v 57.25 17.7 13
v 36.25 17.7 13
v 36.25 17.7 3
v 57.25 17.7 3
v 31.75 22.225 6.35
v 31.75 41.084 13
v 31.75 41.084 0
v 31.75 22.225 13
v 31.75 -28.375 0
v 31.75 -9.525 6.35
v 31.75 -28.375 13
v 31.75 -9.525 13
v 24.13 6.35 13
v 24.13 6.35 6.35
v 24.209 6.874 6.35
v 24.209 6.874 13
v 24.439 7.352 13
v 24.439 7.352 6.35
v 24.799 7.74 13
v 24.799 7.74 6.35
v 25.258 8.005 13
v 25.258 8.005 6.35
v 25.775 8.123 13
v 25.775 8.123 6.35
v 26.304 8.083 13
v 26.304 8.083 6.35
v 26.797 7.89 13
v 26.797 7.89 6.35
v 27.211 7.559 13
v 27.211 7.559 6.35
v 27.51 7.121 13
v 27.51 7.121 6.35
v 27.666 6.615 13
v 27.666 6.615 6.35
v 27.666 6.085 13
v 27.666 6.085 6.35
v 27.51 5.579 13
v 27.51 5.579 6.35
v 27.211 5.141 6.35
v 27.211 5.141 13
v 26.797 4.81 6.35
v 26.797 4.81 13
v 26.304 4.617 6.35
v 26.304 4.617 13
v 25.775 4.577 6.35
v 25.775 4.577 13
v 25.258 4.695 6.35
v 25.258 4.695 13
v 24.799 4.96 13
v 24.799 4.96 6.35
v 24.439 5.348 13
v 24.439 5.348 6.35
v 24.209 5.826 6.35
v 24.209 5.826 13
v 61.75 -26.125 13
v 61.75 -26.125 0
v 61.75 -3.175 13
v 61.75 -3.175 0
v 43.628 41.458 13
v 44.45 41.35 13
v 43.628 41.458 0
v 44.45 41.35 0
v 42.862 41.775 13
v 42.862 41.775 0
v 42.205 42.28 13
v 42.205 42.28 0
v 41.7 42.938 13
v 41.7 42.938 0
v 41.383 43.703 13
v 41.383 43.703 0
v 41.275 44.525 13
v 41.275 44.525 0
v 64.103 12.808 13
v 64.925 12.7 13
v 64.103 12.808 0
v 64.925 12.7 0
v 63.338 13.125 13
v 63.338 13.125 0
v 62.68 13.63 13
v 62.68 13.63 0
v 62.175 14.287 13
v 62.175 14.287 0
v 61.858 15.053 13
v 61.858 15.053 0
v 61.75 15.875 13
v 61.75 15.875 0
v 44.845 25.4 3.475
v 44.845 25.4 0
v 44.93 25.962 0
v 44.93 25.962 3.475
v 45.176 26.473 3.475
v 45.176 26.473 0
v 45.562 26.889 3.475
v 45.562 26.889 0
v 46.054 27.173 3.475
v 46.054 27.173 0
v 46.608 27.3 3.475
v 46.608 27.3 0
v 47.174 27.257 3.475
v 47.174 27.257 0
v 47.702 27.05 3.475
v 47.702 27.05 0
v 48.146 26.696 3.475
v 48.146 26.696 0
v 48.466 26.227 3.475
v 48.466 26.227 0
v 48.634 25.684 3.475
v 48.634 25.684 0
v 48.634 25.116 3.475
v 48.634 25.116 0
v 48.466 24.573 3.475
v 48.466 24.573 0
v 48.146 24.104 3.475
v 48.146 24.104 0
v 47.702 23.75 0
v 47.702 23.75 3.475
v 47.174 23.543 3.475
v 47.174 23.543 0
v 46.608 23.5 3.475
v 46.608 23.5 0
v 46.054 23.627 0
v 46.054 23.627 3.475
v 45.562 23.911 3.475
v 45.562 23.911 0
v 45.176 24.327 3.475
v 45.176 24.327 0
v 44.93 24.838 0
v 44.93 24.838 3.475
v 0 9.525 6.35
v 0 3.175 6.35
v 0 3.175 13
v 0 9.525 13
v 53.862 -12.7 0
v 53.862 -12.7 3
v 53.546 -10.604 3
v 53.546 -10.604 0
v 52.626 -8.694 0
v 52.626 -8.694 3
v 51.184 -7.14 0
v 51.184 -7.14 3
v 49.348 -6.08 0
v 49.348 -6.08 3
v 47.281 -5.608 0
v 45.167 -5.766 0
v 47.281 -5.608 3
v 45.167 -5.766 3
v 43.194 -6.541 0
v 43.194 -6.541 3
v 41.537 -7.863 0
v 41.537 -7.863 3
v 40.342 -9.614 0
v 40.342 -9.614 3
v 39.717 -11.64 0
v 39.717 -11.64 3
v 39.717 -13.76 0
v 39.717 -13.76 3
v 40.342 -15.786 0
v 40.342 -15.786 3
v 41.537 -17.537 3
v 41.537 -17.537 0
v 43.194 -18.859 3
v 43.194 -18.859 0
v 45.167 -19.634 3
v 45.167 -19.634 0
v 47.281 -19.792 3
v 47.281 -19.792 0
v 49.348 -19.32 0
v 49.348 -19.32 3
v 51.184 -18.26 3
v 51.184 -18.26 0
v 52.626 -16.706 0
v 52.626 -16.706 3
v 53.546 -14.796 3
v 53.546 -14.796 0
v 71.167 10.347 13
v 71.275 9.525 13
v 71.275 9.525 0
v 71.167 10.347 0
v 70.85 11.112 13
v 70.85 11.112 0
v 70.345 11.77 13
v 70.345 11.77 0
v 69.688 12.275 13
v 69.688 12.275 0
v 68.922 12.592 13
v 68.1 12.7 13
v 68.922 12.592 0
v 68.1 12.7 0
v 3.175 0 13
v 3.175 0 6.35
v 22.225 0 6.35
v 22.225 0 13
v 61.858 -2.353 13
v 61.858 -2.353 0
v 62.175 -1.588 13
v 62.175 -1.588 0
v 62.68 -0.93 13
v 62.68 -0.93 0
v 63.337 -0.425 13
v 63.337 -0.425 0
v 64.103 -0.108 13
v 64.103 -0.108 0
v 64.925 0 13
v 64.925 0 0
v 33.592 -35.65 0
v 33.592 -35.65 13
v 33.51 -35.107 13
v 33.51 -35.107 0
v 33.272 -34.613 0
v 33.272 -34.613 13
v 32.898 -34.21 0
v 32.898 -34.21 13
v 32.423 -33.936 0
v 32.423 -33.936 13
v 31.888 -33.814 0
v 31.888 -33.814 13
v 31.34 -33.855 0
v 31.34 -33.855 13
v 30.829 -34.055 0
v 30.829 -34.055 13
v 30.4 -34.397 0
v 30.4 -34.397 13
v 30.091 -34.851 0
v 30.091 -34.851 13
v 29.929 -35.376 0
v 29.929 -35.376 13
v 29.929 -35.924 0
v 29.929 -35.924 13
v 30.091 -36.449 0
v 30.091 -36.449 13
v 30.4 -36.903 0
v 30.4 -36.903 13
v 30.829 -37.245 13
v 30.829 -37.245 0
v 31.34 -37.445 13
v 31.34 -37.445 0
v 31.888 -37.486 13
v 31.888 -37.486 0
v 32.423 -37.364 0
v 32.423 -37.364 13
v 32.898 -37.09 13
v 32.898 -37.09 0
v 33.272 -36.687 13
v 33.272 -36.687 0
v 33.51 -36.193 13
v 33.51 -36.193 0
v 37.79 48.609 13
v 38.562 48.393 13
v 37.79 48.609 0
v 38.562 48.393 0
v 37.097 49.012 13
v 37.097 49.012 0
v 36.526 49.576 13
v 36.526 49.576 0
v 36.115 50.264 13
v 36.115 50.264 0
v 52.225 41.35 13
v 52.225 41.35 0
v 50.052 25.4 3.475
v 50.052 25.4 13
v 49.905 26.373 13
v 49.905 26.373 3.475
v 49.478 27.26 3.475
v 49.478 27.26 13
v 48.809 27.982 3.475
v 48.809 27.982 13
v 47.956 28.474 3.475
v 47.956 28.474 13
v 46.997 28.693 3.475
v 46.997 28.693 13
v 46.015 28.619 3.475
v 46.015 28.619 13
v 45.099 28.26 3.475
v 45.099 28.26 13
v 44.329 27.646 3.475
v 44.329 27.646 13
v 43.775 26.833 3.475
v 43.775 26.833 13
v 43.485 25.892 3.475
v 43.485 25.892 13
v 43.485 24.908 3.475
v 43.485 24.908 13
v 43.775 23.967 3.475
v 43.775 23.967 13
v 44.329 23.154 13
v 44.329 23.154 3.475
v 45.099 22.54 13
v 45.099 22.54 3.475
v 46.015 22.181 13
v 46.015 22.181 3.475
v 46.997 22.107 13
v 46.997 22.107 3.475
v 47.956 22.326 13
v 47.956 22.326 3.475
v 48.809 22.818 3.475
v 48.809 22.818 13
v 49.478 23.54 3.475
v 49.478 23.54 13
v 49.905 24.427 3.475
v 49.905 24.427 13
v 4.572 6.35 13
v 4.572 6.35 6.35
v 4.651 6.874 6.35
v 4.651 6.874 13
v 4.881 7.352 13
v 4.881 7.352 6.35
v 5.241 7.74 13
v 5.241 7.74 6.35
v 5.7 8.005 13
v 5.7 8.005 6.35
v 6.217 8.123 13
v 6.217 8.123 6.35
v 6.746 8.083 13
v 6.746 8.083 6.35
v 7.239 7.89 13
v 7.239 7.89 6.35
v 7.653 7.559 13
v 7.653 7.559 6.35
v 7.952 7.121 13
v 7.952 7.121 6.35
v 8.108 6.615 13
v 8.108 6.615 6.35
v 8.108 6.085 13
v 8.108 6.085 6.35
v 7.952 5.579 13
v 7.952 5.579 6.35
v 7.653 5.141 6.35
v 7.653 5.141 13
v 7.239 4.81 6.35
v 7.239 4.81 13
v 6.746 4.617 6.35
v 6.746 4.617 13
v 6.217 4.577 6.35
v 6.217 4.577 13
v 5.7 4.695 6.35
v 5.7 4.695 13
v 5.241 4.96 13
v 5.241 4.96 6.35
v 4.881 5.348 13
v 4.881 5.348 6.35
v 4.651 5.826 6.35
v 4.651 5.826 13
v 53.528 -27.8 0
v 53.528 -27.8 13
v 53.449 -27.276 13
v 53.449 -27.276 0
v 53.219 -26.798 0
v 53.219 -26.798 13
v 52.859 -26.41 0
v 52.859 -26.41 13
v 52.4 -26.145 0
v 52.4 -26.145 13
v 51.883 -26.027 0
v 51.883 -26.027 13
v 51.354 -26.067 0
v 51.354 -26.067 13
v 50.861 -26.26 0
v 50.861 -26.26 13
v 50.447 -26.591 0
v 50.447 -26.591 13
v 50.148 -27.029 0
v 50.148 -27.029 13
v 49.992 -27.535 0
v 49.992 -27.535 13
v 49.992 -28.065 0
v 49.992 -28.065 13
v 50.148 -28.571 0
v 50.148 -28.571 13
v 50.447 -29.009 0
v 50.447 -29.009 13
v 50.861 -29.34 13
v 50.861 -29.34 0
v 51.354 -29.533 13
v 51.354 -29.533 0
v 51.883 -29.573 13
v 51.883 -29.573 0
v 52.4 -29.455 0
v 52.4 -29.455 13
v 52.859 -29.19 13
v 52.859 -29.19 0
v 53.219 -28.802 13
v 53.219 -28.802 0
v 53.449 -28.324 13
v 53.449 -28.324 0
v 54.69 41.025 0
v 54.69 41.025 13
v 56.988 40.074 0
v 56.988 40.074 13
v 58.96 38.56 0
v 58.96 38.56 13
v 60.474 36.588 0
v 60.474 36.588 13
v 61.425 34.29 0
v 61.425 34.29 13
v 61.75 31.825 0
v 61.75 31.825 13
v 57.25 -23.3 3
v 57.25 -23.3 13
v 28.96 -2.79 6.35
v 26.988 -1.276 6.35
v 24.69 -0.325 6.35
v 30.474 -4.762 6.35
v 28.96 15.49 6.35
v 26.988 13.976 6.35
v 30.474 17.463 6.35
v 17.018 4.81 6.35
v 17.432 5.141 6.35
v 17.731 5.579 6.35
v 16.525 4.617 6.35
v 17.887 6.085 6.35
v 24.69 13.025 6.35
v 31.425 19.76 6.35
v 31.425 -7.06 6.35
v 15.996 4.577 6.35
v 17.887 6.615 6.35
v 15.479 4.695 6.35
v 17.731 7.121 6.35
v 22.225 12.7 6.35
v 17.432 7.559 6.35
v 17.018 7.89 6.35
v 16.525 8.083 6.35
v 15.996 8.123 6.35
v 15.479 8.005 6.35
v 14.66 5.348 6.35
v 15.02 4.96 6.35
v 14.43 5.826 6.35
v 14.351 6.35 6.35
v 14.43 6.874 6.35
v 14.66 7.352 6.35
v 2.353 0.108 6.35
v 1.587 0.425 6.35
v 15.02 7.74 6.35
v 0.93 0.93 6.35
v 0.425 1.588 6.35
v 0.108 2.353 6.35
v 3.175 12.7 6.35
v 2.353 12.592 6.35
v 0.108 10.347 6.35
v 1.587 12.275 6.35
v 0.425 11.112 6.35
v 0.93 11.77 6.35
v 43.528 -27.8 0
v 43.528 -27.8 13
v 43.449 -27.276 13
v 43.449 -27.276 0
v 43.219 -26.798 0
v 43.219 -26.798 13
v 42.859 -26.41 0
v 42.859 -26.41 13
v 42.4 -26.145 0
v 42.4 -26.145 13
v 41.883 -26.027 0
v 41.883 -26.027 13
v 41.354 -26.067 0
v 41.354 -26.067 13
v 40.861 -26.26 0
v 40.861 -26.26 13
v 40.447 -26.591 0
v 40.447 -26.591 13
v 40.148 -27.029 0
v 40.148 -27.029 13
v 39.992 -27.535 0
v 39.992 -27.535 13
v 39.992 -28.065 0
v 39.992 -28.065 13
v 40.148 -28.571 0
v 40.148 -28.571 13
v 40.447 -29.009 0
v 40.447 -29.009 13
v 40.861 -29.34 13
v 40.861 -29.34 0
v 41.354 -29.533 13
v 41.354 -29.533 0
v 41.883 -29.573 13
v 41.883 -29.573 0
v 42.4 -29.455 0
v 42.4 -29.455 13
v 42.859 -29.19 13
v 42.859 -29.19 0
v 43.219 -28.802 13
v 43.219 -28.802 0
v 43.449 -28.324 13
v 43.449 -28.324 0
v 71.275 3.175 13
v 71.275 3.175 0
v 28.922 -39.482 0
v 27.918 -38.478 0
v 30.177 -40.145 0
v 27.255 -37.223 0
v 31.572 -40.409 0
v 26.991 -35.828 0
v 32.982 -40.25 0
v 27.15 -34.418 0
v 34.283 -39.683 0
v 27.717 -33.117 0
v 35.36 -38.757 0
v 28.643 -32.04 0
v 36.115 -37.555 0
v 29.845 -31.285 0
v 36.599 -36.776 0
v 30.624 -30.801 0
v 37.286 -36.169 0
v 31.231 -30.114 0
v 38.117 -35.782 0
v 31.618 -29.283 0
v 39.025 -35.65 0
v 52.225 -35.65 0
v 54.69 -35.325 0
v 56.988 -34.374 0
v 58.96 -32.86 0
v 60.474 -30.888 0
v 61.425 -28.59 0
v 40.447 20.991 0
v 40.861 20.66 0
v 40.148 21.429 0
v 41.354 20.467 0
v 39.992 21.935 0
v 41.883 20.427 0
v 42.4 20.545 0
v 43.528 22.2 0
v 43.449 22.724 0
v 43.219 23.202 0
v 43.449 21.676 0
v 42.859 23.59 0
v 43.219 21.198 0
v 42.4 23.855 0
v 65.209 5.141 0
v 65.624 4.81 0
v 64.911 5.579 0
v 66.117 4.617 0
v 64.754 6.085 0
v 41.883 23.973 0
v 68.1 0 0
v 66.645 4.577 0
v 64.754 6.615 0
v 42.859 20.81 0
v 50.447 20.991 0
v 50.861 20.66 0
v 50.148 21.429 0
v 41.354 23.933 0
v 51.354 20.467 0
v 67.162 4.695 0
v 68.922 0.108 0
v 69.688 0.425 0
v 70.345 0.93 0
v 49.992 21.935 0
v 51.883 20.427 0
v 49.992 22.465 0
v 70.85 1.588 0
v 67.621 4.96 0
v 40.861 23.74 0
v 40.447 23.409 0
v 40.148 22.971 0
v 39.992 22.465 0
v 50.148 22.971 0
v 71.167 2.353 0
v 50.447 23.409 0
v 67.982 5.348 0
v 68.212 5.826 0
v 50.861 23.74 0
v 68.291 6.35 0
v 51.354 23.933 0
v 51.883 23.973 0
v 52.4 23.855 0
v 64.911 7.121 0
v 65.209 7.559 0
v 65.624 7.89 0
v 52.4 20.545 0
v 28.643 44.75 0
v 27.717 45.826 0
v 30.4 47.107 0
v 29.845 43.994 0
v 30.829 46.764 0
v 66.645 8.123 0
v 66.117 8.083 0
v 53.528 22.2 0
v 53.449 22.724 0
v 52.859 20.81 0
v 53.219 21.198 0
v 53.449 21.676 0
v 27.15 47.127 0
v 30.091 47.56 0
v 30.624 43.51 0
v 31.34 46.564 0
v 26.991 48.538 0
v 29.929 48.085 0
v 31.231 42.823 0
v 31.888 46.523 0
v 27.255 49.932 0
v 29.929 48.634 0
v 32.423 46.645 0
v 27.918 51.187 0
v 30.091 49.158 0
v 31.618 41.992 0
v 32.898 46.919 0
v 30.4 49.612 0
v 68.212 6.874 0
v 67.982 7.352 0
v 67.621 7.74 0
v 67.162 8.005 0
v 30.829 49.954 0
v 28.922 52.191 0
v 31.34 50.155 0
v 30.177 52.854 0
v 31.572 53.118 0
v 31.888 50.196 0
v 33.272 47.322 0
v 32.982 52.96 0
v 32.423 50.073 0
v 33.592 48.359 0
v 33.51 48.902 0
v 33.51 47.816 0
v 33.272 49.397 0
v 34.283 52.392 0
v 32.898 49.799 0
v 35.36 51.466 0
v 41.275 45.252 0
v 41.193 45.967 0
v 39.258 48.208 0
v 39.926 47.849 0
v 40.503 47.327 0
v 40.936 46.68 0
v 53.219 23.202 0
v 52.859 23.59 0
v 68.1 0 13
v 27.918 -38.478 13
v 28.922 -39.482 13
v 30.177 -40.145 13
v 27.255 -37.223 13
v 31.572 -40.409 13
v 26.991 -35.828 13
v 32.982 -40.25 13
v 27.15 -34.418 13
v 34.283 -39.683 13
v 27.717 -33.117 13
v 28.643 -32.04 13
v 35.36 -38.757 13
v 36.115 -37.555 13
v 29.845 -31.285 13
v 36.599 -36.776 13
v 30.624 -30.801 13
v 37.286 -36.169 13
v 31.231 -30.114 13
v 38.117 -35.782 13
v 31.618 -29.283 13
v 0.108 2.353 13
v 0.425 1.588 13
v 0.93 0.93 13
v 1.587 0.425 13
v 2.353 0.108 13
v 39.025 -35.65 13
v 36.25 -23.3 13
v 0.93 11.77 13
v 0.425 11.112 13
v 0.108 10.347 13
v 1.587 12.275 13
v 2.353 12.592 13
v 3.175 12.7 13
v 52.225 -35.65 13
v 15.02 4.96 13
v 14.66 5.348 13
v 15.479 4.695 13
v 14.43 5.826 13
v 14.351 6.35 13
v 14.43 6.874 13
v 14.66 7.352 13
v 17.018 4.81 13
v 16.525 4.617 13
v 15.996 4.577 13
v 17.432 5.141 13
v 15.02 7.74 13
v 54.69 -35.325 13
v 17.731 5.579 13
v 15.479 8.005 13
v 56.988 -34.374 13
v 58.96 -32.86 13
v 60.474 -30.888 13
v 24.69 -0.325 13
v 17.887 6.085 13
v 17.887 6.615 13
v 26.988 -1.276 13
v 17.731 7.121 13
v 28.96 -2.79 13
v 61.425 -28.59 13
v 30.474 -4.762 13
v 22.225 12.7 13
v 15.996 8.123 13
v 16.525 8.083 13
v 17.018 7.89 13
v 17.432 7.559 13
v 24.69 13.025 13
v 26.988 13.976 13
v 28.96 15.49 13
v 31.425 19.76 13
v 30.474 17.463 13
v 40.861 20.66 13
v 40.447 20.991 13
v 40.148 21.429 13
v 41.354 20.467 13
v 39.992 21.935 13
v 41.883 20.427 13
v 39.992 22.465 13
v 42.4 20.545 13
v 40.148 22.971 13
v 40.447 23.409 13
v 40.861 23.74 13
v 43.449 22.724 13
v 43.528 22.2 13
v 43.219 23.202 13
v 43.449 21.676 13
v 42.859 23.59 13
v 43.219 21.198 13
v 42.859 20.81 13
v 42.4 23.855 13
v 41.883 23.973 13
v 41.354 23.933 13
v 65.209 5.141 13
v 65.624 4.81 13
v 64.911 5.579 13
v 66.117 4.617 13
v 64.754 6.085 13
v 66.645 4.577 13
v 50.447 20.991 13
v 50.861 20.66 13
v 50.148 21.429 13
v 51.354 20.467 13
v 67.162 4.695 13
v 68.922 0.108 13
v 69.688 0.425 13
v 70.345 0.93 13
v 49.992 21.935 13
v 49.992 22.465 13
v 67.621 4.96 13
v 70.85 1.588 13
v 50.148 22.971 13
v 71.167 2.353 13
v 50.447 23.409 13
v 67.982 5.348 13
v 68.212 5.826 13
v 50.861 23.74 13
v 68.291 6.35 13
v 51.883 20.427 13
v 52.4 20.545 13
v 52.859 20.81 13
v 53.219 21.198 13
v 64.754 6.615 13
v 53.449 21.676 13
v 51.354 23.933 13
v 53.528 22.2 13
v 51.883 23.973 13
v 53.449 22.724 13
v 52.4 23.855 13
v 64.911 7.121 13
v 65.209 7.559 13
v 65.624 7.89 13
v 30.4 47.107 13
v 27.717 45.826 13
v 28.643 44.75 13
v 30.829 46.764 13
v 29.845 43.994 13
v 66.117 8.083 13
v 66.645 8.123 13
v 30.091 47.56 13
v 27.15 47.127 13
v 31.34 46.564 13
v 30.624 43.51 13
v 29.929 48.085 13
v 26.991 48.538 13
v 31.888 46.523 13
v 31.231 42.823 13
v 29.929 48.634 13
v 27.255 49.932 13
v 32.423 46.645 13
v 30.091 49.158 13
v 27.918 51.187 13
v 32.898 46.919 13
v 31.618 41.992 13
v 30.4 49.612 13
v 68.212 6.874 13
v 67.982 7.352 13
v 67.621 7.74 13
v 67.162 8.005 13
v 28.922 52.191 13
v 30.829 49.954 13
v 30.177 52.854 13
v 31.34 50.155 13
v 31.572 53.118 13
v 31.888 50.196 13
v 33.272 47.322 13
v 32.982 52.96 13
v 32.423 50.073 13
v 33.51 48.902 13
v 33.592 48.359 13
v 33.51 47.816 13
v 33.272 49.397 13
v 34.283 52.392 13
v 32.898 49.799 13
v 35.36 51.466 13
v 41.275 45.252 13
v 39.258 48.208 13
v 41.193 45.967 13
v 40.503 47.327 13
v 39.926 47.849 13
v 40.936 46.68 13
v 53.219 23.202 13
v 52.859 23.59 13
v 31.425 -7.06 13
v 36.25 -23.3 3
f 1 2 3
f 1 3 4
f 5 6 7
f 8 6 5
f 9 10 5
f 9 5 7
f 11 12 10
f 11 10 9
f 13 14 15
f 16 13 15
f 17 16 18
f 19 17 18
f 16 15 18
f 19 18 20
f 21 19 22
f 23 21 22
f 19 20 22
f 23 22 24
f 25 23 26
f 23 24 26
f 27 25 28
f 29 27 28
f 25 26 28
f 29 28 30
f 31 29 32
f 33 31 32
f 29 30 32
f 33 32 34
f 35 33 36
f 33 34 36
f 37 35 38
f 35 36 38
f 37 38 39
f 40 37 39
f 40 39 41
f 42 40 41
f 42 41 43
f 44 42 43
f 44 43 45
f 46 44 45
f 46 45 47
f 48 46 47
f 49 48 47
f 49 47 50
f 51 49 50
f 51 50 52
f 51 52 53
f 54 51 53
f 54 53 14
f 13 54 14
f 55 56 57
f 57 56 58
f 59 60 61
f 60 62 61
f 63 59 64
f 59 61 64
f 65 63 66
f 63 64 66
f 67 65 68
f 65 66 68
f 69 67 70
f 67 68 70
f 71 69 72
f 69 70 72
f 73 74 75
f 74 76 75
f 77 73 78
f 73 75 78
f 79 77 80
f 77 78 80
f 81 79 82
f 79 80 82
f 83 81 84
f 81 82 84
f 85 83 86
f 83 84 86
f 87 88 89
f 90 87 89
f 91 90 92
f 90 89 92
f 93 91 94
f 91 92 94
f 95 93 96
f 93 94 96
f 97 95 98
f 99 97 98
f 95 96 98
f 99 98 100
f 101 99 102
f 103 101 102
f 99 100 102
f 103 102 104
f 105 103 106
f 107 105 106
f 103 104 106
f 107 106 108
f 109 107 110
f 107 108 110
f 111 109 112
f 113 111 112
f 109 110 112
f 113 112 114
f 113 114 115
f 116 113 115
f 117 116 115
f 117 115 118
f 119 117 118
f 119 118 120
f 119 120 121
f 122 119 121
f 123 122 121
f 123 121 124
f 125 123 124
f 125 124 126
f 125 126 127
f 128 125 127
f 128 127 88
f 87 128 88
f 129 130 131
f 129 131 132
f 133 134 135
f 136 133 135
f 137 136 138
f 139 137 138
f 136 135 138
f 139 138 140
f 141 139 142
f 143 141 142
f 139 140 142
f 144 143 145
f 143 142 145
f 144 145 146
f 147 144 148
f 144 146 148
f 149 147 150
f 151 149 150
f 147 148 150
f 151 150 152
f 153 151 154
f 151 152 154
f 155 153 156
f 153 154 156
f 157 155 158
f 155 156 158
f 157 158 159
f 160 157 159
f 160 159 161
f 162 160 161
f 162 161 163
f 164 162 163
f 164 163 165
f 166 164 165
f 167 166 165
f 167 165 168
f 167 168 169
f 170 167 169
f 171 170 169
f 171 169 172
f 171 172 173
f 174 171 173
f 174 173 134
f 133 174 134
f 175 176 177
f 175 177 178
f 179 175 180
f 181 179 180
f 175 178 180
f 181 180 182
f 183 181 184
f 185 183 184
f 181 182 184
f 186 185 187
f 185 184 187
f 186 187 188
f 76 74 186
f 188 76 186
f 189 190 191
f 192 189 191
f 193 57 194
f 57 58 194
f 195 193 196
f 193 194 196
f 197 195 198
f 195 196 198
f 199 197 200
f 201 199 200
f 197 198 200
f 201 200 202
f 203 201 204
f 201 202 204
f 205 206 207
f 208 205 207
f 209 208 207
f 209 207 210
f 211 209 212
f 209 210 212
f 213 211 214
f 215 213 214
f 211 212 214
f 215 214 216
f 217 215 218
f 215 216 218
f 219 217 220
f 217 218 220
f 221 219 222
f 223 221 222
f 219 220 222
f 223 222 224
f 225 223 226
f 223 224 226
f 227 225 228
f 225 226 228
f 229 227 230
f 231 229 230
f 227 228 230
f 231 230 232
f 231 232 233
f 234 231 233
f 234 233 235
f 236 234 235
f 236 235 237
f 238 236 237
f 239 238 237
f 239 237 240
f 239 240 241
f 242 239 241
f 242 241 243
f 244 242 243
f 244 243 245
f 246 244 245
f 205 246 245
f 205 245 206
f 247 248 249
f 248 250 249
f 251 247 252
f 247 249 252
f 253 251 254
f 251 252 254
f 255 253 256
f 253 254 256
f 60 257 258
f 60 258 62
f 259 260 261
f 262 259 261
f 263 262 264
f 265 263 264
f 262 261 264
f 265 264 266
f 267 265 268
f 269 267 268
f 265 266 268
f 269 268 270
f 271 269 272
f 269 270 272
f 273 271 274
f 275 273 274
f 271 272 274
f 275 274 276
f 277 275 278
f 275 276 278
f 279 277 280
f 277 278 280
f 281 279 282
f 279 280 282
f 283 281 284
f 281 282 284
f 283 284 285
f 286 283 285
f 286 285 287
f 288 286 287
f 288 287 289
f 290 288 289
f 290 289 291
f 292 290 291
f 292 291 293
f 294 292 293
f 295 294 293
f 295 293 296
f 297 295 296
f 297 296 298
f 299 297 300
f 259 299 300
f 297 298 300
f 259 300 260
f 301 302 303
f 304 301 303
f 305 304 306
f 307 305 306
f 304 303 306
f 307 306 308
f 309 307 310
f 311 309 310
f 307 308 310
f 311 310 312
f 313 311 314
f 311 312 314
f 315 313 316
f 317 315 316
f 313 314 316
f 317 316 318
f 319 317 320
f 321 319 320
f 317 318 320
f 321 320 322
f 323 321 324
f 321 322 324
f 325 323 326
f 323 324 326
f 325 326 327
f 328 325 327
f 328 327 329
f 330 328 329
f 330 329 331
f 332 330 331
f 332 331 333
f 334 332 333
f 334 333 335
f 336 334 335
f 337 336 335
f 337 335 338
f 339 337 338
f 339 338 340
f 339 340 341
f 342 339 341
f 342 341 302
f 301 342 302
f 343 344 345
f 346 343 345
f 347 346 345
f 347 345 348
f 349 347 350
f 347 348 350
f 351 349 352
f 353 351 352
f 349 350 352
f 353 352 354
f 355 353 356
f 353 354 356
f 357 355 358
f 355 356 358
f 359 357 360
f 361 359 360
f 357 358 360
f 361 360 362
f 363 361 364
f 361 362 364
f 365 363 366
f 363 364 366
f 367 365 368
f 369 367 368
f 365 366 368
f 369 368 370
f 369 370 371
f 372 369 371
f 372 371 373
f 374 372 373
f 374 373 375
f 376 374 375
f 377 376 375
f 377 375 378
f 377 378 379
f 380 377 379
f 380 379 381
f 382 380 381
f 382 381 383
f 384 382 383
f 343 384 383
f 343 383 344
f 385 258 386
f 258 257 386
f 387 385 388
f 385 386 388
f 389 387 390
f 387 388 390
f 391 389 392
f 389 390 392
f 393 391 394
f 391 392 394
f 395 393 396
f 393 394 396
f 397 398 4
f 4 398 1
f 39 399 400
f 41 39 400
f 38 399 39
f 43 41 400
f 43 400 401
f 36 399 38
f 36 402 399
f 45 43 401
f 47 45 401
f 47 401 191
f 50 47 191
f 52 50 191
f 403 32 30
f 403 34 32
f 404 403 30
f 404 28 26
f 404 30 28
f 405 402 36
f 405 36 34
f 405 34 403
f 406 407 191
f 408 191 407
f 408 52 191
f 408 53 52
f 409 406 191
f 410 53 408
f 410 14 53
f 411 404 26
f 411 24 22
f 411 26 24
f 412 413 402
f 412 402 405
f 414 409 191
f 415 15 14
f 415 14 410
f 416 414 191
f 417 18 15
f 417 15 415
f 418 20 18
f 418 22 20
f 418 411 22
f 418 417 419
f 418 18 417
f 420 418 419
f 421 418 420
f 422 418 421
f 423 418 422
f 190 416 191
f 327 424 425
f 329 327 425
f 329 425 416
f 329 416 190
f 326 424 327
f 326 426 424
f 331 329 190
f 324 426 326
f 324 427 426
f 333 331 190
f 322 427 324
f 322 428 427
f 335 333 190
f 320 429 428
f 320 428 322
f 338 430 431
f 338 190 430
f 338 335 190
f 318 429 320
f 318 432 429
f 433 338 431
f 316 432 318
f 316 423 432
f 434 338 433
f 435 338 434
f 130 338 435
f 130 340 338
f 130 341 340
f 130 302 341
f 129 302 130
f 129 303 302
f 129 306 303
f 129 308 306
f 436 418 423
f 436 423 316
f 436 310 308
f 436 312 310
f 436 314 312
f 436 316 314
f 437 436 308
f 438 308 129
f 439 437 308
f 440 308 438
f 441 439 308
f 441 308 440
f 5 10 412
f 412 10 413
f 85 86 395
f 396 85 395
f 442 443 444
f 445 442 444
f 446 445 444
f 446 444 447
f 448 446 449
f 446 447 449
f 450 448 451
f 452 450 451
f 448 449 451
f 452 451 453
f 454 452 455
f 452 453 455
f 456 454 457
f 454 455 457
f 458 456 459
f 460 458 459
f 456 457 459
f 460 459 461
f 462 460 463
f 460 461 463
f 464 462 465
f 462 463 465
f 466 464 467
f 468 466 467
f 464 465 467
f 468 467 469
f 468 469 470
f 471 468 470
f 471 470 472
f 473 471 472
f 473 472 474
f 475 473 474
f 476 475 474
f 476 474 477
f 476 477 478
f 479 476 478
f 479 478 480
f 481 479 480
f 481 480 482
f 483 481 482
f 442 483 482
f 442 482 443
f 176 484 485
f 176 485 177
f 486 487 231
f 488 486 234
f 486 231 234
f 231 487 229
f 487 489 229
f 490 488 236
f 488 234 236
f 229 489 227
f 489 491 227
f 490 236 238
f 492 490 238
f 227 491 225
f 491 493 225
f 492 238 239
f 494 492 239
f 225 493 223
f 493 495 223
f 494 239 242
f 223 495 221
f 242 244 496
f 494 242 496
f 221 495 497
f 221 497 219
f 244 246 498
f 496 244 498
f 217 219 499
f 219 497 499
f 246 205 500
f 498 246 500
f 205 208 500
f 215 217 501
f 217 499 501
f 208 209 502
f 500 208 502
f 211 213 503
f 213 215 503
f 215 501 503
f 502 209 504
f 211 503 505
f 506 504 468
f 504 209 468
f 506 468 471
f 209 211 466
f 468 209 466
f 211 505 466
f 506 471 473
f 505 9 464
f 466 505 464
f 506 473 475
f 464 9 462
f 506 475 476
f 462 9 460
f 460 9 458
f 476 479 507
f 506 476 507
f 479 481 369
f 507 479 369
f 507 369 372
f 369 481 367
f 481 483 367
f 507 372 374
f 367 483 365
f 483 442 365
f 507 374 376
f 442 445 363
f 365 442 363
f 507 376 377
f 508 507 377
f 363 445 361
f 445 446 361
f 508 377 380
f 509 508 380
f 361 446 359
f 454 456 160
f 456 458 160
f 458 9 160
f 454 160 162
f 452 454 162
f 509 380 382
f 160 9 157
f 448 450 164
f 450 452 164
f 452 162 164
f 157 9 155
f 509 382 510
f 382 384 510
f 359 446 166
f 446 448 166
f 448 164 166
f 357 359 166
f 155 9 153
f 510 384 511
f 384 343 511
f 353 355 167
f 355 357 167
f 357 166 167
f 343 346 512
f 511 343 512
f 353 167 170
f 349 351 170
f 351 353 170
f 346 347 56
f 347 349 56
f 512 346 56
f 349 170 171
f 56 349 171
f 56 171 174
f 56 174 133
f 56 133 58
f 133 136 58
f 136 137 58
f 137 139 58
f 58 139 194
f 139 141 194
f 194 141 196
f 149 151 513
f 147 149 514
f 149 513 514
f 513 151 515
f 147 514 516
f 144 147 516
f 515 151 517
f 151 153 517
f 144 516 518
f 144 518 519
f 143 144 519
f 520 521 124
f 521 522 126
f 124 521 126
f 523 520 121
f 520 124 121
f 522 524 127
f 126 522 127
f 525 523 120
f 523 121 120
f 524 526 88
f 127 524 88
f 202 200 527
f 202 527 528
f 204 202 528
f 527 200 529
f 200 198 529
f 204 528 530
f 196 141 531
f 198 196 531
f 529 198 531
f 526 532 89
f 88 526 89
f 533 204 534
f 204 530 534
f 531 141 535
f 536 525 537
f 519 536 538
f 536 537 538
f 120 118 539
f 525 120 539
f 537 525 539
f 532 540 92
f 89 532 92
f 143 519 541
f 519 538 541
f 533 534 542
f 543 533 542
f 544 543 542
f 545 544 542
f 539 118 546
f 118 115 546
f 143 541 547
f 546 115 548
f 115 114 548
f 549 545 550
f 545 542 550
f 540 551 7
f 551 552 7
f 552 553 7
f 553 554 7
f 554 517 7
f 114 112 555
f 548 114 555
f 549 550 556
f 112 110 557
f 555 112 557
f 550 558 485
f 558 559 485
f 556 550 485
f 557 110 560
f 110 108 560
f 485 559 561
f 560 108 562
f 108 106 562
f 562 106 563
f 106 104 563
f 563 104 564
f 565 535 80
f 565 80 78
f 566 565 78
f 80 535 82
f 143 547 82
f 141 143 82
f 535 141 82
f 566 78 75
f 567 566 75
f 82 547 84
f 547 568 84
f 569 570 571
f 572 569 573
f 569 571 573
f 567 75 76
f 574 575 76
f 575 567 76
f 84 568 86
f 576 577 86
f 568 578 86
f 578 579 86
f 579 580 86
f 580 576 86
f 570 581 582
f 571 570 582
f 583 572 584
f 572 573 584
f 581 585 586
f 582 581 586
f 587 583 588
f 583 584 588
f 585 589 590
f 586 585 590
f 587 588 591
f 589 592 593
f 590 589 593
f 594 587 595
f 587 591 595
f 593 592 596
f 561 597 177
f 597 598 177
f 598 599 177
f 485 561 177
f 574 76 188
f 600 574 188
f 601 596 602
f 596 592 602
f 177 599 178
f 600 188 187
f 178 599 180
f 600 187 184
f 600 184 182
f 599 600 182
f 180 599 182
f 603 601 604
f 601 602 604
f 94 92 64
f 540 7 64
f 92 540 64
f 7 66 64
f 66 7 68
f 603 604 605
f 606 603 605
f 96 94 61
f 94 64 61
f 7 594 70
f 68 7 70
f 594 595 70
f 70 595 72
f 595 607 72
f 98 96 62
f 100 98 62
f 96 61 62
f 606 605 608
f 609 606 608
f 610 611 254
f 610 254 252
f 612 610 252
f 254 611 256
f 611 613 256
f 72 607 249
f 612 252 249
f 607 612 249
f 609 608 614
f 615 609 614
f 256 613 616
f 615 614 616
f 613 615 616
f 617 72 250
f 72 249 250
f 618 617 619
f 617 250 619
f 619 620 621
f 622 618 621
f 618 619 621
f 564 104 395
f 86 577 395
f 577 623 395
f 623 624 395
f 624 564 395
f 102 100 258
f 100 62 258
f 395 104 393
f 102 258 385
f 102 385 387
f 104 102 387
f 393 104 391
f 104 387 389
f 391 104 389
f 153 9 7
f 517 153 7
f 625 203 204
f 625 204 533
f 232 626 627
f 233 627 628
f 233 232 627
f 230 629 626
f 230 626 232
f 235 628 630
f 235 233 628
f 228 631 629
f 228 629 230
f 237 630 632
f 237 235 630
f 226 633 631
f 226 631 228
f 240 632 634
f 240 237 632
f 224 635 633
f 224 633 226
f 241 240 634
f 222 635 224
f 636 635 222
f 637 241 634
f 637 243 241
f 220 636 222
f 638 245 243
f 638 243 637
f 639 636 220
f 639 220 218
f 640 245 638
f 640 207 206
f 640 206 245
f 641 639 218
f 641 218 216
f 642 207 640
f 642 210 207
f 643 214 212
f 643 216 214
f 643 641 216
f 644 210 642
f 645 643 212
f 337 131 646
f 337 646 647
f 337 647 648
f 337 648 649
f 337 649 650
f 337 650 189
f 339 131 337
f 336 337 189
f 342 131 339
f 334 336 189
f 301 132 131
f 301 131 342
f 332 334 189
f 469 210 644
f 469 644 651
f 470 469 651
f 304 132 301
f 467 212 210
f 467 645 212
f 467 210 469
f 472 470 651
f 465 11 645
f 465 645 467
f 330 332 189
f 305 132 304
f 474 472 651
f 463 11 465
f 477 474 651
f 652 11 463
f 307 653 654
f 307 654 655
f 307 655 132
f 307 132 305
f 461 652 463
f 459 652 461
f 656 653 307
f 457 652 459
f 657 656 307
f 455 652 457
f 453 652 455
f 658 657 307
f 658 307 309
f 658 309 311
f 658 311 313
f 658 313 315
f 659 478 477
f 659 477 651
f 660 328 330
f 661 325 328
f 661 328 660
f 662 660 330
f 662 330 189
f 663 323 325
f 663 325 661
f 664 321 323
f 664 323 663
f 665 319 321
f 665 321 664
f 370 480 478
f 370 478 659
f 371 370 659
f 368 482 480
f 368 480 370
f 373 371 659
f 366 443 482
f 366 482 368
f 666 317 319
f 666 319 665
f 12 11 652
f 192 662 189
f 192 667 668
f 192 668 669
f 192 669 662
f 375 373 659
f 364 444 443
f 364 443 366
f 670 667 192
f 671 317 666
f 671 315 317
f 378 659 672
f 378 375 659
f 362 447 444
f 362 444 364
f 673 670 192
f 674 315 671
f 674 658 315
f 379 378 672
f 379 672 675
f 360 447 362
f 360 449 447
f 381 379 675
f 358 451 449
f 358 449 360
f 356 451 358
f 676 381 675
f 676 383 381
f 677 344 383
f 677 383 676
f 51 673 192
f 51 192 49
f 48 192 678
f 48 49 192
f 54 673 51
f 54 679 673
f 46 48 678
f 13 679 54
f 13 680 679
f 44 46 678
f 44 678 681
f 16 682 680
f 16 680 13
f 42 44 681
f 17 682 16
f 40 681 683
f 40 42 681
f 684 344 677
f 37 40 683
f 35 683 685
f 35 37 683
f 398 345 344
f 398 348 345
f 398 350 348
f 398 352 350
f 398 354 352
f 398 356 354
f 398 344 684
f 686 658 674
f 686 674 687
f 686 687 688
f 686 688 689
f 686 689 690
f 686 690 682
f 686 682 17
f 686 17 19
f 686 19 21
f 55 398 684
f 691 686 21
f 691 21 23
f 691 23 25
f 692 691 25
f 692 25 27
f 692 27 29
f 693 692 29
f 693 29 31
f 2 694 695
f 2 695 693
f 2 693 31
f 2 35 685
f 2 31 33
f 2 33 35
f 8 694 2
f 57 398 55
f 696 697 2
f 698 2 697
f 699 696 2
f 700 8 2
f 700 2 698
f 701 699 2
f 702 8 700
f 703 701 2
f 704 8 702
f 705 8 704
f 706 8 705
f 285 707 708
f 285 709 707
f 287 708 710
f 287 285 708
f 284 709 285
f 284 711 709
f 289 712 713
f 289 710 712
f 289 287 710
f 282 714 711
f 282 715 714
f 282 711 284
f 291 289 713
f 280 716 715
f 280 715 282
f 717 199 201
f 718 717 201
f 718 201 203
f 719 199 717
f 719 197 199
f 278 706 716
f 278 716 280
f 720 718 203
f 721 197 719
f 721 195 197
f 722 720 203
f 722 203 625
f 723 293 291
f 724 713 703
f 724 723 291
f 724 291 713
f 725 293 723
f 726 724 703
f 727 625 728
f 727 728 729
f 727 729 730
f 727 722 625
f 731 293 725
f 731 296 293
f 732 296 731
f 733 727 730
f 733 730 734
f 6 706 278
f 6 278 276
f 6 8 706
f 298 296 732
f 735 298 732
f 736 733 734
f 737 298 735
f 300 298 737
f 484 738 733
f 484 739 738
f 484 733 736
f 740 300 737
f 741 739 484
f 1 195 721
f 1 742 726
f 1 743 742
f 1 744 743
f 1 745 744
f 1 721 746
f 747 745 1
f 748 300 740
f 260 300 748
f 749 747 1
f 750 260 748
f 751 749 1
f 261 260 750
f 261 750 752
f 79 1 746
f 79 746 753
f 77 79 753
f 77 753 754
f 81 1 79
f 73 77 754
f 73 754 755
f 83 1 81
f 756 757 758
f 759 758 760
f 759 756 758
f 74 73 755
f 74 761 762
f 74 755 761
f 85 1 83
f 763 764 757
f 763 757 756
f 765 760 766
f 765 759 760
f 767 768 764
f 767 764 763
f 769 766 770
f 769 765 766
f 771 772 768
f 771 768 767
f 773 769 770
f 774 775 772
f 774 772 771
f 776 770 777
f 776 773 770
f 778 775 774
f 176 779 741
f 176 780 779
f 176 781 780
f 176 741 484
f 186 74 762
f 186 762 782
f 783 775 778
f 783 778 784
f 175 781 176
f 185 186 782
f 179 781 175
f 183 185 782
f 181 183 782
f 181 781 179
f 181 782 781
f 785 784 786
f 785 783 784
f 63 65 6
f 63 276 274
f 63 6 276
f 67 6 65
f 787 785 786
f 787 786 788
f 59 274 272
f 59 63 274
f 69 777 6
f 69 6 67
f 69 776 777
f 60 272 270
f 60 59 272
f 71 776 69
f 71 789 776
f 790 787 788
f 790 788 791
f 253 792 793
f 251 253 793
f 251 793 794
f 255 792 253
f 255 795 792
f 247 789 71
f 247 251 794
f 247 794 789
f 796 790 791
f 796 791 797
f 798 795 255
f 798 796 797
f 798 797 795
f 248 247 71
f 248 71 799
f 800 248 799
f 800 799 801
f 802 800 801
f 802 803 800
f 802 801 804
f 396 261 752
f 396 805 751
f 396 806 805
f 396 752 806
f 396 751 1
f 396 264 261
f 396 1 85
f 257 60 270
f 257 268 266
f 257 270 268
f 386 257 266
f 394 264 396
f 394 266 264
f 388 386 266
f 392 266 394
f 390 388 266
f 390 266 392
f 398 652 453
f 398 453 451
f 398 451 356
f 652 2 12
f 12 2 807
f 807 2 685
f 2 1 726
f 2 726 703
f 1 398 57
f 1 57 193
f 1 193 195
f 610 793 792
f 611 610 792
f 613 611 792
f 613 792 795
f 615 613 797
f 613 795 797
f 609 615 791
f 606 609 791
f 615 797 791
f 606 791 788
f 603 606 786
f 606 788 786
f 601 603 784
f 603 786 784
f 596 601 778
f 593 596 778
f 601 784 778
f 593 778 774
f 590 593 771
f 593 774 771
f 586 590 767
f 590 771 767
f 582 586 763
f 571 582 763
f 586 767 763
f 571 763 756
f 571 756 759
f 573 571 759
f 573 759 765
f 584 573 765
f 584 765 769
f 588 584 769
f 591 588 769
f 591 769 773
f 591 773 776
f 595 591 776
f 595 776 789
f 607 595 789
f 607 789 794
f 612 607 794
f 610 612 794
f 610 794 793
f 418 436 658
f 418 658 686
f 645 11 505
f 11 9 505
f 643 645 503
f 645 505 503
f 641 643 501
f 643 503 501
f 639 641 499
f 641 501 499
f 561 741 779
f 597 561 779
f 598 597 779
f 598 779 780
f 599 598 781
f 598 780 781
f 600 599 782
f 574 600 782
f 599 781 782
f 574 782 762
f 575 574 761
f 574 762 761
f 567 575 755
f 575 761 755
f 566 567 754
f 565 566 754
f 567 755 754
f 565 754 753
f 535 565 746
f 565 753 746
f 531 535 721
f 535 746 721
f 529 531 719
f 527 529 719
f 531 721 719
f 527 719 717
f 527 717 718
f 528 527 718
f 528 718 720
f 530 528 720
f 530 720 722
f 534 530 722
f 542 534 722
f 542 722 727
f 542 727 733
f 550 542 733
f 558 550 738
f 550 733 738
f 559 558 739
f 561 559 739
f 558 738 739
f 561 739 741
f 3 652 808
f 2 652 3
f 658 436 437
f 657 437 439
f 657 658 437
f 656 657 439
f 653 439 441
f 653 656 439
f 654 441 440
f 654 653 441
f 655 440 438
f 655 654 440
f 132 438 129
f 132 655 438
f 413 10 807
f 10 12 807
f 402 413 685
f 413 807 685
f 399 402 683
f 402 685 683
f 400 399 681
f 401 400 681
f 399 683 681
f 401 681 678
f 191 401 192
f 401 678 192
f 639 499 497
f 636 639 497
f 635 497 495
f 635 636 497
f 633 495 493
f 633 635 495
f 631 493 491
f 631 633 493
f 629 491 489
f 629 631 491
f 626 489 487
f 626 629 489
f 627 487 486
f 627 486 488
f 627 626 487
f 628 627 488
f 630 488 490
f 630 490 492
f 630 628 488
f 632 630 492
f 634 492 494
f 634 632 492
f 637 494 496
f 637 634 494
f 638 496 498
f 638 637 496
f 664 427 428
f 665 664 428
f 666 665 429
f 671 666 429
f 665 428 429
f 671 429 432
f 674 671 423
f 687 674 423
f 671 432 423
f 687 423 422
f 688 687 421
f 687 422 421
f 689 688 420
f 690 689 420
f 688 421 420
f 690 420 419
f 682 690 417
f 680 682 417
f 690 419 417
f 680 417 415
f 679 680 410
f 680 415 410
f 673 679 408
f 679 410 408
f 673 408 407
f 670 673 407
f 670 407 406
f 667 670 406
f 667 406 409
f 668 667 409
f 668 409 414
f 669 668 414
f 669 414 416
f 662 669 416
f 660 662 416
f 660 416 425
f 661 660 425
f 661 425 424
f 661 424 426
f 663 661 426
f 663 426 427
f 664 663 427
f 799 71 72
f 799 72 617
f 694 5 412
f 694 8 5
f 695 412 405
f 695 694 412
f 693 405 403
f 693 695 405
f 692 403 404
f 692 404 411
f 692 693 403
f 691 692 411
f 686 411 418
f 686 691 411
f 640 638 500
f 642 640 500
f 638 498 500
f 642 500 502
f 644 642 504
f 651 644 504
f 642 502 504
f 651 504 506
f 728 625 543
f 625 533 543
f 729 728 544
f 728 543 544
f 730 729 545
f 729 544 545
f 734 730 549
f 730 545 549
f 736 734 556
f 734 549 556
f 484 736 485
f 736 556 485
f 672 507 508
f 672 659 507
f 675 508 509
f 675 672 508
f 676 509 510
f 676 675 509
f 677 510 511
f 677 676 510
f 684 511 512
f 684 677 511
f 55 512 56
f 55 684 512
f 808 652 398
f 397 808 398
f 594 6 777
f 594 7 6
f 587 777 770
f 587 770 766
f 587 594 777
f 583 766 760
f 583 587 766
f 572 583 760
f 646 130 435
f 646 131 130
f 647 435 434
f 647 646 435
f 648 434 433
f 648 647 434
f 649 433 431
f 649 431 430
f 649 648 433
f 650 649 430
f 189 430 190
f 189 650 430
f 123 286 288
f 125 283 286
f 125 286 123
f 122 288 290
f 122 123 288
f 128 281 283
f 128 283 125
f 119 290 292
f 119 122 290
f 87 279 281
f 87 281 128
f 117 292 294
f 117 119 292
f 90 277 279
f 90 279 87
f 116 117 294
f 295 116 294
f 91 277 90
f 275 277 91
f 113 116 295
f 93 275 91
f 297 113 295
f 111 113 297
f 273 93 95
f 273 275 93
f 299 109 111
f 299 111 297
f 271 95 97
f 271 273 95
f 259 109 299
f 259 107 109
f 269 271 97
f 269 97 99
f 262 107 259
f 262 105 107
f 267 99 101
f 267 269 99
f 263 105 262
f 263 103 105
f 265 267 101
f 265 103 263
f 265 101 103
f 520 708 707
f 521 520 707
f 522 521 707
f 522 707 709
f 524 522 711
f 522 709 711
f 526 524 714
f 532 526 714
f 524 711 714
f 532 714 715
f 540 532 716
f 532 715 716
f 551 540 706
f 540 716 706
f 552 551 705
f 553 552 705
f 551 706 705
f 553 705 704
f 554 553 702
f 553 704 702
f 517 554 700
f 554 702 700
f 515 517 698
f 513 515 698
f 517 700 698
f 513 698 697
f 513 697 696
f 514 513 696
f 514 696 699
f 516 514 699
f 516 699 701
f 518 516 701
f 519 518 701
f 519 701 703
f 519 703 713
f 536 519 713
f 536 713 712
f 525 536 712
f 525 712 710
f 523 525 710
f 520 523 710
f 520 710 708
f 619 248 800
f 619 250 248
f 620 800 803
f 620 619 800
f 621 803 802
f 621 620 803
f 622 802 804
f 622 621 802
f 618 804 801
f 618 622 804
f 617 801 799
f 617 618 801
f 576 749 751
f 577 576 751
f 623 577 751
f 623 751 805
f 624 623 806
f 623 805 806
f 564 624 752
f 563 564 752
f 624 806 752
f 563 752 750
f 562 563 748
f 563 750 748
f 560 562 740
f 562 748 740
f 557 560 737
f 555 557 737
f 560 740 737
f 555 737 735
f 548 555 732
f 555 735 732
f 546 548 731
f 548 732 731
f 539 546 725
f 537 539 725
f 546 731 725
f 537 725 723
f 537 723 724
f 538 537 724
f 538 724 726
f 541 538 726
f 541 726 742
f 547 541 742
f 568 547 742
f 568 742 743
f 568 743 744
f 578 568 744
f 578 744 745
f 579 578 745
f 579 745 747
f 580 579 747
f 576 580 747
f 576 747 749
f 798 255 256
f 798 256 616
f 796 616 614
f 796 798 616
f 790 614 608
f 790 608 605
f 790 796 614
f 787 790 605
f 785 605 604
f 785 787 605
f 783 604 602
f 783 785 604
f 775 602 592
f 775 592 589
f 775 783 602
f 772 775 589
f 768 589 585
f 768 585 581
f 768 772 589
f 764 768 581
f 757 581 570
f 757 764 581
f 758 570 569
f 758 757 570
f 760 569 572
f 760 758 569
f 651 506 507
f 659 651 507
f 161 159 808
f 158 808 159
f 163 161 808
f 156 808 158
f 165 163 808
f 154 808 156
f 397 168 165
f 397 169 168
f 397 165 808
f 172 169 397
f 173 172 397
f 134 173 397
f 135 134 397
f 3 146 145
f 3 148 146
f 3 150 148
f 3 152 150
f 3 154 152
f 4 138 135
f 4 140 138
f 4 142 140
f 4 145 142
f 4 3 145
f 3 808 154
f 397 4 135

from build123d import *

# Parameters (mm, degrees)
SKETCH1_W           = 31.75
SKETCH1_H           = 12.7
SKETCH1_W_2         = 30
SKETCH1_H_2         = 7
BOSS_EXTRUDE1_DEPTH = 13
SKETCH4_R           = 1.778
CUT_EXTRUDE3_DEPTH  = 14
SKETCH5_W           = 21
SKETCH5_H           = 41
CUT_EXTRUDE4_DEPTH  = 10
SKETCH6_R           = 7.112
CUT_EXTRUDE5_DEPTH  = 4
SKETCH7_W           = 31.75
SKETCH7_H           = 12.7
CUT_EXTRUDE6_DEPTH  = 6.35
SKETCH8_R           = 1.778
CUT_EXTRUDE7_DEPTH  = 7.65
SKETCH10_R          = 1.905
CUT_EXTRUDE8_DEPTH  = 14
SKETCH11_R          = 3.302
CUT_EXTRUDE9_DEPTH  = 9.525
SKETCH13_W          = 9.525
SKETCH13_H          = 12.7
SKETCH13_R          = 1.778
BOSS_EXTRUDE2_DEPTH = 13
BOSS_EXTRUDE3_DEPTH = 13
SKETCH18_R          = 1.8415
CUT_EXTRUDE10_DEPTH = 14
FILLET1_R           = 9.525
FILLET2_R           = 3.175
FILLET3_R           = 3.175


with BuildPart() as part:
    # Sketch1 → Boss-Extrude1 (new body)
    with BuildSketch(Plane.XY):
        Polygon((31.75, 12.7), (31.75, 0), (31.75, -28.65), (61.75, -28.65), (61.75, 0), (61.75, 12.7), (61.75, 41.35), (31.75, 41.35), align=None)
        with Locations((15.875, 6.35)):
            Rectangle(SKETCH1_W, SKETCH1_H)
        with Locations((46.75, -32.15)):
            Rectangle(SKETCH1_W_2, SKETCH1_H_2)
    extrude(amount=BOSS_EXTRUDE1_DEPTH)

    # Sketch4 → Cut-Extrude3 (cut, through all)
    with BuildSketch(Plane.XY.offset(13)):
        with Locations((41.75, 22.199999832)):
            Circle(SKETCH4_R)
        with Locations((51.75, 22.199999832)):
            Circle(SKETCH4_R)
        with Locations((41.75, -27.800000168)):
            Circle(SKETCH4_R)
        with Locations((51.75, -27.800000168)):
            Circle(SKETCH4_R)
    extrude(amount=-CUT_EXTRUDE3_DEPTH, mode=Mode.SUBTRACT)

    # Sketch5 → Cut-Extrude4 (cut)
    with BuildSketch(Plane.XY.offset(13)):
        with Locations((46.75, -2.800000024)):
            Rectangle(SKETCH5_W, SKETCH5_H)
    extrude(amount=-CUT_EXTRUDE4_DEPTH, mode=Mode.SUBTRACT)

    # Sketch6 → Cut-Extrude5 (cut, through all)
    with BuildSketch(Plane.XY.offset(3)):
        with Locations((46.75, -12.700000168)):
            Circle(SKETCH6_R)
    extrude(amount=-CUT_EXTRUDE5_DEPTH, mode=Mode.SUBTRACT)

    # Sketch7 → Cut-Extrude6 (cut)
    with BuildSketch(Plane(origin=(0, 0, 0), x_dir=(-1, 0, 0), z_dir=(0, 0, -1))):
        with Locations((-15.875, 6.35)):
            Rectangle(SKETCH7_W, SKETCH7_H)
    extrude(amount=-CUT_EXTRUDE6_DEPTH, mode=Mode.SUBTRACT)

    # Sketch8 → Cut-Extrude7 (cut, through all)
    with BuildSketch(Plane(origin=(0, 0, 6.35), x_dir=(-1, 0, 0), z_dir=(0, 0, -1))):
        with Locations((-6.35, 6.35)):
            Circle(SKETCH8_R)
        with Locations((-25.908, 6.35)):
            Circle(SKETCH8_R)
        with Locations((-16.129, 6.35)):
            Circle(SKETCH8_R)
    extrude(amount=-CUT_EXTRUDE7_DEPTH, mode=Mode.SUBTRACT)

    # Sketch10 → Cut-Extrude8 (cut, through all)
    with BuildSketch(Plane(origin=(0, 0, 0), x_dir=(-1, 0, 0), z_dir=(0, 0, -1))):
        with Locations((-46.75, 25.4)):
            Circle(SKETCH10_R)
    extrude(amount=-CUT_EXTRUDE8_DEPTH, mode=Mode.SUBTRACT)

    # Sketch11 → Cut-Extrude9 (cut)
    with BuildSketch(Plane.XY.offset(13)):
        with Locations((46.75, 25.4)):
            Circle(SKETCH11_R)
    extrude(amount=-CUT_EXTRUDE9_DEPTH, mode=Mode.SUBTRACT)

    # Sketch13 → Boss-Extrude2 (add)
    with BuildSketch(Plane.XY.offset(13)):
        with Locations((66.5125, 6.35)):
            Rectangle(SKETCH13_W, SKETCH13_H)
        with Locations((66.5125, 6.35)):
            Circle(SKETCH13_R, mode=Mode.SUBTRACT)
    extrude(amount=-BOSS_EXTRUDE2_DEPTH)

    # Sketch17 → Boss-Extrude3 (add)
    with BuildSketch(Plane.XY.offset(13)):
        with BuildLine():
            ThreePointArc((36.5125, 48.359214074), (28.382403955, 51.726810119), (31.75, 43.596714074))
            Line((31.75, 43.596714074), (31.75, 48.359214074))
            Line((31.75, 48.359214074), (36.5125, 48.359214074))
        make_face()
        with BuildLine():
            Line((31.75, 48.359214074), (31.75, 43.596714074))
            ThreePointArc((31.75, 43.596714074), (35.117596045, 44.991618029), (36.5125, 48.359214074))
            Line((36.5125, 48.359214074), (31.75, 48.359214074))
        make_face()
        with BuildLine():
            Line((31.75, 43.596714074), (31.75, 41.35))
            Line((31.75, 41.35), (41.275, 41.35))
            Line((41.275, 41.35), (41.275, 48.359214074))
            Line((41.275, 48.359214074), (36.5125, 48.359214074))
            ThreePointArc((36.5125, 48.359214074), (35.117596045, 44.991618029), (31.75, 43.596714074))
        make_face()
        with BuildLine():
            Line((31.75, -35.65), (36.5125, -35.65))
            ThreePointArc((36.5125, -35.65), (35.117596045, -32.282403955), (31.75, -30.8875))
            Line((31.75, -30.8875), (31.75, -35.65))
        make_face()
        with BuildLine():
            ThreePointArc((31.75, -30.8875), (28.382403955, -39.017596045), (36.5125, -35.65))
            Line((36.5125, -35.65), (31.75, -35.65))
            Line((31.75, -35.65), (31.75, -30.8875))
        make_face()
    extrude(amount=-BOSS_EXTRUDE3_DEPTH)

    # Sketch18 → Cut-Extrude10 (cut, through all)
    with BuildSketch(Plane.XY.offset(13)):
        with Locations((31.75, -35.65)):
            Circle(SKETCH18_R)
        with Locations((31.75, 48.359214074)):
            Circle(SKETCH18_R)
    extrude(amount=-CUT_EXTRUDE10_DEPTH, mode=Mode.SUBTRACT)

    # Fillet1
    fillet1_edges = [part.edges().sort_by_distance(p)[0] for p in [
        (31.75, 0, 9.675),
        (31.75, 12.7, 9.675),
        (61.75, 41.35, 6.5),
        (61.75, -35.65, 6.5),
    ]]
    fillet(fillet1_edges, radius=FILLET1_R)

    # Fillet2
    fillet2_edges = [part.edges().sort_by_distance(p)[0] for p in [
        (71.275, 0, 6.5),
        (71.275, 12.7, 6.5),
        (61.75, 12.7, 6.5),
        (61.75, 0, 6.5),
        (31.75, -30.8875, 6.5),
        (36.5125, -35.65, 6.5),
        (31.75, 43.596714074, 6.5),
        (41.275, 41.35, 6.5),
        (36.5125, 48.359214074, 6.5),
    ]]
    fillet(fillet2_edges, radius=FILLET2_R)

    # Fillet3
    fillet3_edges = [part.edges().sort_by_distance(p)[0] for p in [
        (41.275, 48.359214074, 6.5),
        (0, 12.7, 9.675),
        (0, 0, 9.675),
    ]]
    fillet(fillet3_edges, radius=FILLET3_R)


solid = part.part
